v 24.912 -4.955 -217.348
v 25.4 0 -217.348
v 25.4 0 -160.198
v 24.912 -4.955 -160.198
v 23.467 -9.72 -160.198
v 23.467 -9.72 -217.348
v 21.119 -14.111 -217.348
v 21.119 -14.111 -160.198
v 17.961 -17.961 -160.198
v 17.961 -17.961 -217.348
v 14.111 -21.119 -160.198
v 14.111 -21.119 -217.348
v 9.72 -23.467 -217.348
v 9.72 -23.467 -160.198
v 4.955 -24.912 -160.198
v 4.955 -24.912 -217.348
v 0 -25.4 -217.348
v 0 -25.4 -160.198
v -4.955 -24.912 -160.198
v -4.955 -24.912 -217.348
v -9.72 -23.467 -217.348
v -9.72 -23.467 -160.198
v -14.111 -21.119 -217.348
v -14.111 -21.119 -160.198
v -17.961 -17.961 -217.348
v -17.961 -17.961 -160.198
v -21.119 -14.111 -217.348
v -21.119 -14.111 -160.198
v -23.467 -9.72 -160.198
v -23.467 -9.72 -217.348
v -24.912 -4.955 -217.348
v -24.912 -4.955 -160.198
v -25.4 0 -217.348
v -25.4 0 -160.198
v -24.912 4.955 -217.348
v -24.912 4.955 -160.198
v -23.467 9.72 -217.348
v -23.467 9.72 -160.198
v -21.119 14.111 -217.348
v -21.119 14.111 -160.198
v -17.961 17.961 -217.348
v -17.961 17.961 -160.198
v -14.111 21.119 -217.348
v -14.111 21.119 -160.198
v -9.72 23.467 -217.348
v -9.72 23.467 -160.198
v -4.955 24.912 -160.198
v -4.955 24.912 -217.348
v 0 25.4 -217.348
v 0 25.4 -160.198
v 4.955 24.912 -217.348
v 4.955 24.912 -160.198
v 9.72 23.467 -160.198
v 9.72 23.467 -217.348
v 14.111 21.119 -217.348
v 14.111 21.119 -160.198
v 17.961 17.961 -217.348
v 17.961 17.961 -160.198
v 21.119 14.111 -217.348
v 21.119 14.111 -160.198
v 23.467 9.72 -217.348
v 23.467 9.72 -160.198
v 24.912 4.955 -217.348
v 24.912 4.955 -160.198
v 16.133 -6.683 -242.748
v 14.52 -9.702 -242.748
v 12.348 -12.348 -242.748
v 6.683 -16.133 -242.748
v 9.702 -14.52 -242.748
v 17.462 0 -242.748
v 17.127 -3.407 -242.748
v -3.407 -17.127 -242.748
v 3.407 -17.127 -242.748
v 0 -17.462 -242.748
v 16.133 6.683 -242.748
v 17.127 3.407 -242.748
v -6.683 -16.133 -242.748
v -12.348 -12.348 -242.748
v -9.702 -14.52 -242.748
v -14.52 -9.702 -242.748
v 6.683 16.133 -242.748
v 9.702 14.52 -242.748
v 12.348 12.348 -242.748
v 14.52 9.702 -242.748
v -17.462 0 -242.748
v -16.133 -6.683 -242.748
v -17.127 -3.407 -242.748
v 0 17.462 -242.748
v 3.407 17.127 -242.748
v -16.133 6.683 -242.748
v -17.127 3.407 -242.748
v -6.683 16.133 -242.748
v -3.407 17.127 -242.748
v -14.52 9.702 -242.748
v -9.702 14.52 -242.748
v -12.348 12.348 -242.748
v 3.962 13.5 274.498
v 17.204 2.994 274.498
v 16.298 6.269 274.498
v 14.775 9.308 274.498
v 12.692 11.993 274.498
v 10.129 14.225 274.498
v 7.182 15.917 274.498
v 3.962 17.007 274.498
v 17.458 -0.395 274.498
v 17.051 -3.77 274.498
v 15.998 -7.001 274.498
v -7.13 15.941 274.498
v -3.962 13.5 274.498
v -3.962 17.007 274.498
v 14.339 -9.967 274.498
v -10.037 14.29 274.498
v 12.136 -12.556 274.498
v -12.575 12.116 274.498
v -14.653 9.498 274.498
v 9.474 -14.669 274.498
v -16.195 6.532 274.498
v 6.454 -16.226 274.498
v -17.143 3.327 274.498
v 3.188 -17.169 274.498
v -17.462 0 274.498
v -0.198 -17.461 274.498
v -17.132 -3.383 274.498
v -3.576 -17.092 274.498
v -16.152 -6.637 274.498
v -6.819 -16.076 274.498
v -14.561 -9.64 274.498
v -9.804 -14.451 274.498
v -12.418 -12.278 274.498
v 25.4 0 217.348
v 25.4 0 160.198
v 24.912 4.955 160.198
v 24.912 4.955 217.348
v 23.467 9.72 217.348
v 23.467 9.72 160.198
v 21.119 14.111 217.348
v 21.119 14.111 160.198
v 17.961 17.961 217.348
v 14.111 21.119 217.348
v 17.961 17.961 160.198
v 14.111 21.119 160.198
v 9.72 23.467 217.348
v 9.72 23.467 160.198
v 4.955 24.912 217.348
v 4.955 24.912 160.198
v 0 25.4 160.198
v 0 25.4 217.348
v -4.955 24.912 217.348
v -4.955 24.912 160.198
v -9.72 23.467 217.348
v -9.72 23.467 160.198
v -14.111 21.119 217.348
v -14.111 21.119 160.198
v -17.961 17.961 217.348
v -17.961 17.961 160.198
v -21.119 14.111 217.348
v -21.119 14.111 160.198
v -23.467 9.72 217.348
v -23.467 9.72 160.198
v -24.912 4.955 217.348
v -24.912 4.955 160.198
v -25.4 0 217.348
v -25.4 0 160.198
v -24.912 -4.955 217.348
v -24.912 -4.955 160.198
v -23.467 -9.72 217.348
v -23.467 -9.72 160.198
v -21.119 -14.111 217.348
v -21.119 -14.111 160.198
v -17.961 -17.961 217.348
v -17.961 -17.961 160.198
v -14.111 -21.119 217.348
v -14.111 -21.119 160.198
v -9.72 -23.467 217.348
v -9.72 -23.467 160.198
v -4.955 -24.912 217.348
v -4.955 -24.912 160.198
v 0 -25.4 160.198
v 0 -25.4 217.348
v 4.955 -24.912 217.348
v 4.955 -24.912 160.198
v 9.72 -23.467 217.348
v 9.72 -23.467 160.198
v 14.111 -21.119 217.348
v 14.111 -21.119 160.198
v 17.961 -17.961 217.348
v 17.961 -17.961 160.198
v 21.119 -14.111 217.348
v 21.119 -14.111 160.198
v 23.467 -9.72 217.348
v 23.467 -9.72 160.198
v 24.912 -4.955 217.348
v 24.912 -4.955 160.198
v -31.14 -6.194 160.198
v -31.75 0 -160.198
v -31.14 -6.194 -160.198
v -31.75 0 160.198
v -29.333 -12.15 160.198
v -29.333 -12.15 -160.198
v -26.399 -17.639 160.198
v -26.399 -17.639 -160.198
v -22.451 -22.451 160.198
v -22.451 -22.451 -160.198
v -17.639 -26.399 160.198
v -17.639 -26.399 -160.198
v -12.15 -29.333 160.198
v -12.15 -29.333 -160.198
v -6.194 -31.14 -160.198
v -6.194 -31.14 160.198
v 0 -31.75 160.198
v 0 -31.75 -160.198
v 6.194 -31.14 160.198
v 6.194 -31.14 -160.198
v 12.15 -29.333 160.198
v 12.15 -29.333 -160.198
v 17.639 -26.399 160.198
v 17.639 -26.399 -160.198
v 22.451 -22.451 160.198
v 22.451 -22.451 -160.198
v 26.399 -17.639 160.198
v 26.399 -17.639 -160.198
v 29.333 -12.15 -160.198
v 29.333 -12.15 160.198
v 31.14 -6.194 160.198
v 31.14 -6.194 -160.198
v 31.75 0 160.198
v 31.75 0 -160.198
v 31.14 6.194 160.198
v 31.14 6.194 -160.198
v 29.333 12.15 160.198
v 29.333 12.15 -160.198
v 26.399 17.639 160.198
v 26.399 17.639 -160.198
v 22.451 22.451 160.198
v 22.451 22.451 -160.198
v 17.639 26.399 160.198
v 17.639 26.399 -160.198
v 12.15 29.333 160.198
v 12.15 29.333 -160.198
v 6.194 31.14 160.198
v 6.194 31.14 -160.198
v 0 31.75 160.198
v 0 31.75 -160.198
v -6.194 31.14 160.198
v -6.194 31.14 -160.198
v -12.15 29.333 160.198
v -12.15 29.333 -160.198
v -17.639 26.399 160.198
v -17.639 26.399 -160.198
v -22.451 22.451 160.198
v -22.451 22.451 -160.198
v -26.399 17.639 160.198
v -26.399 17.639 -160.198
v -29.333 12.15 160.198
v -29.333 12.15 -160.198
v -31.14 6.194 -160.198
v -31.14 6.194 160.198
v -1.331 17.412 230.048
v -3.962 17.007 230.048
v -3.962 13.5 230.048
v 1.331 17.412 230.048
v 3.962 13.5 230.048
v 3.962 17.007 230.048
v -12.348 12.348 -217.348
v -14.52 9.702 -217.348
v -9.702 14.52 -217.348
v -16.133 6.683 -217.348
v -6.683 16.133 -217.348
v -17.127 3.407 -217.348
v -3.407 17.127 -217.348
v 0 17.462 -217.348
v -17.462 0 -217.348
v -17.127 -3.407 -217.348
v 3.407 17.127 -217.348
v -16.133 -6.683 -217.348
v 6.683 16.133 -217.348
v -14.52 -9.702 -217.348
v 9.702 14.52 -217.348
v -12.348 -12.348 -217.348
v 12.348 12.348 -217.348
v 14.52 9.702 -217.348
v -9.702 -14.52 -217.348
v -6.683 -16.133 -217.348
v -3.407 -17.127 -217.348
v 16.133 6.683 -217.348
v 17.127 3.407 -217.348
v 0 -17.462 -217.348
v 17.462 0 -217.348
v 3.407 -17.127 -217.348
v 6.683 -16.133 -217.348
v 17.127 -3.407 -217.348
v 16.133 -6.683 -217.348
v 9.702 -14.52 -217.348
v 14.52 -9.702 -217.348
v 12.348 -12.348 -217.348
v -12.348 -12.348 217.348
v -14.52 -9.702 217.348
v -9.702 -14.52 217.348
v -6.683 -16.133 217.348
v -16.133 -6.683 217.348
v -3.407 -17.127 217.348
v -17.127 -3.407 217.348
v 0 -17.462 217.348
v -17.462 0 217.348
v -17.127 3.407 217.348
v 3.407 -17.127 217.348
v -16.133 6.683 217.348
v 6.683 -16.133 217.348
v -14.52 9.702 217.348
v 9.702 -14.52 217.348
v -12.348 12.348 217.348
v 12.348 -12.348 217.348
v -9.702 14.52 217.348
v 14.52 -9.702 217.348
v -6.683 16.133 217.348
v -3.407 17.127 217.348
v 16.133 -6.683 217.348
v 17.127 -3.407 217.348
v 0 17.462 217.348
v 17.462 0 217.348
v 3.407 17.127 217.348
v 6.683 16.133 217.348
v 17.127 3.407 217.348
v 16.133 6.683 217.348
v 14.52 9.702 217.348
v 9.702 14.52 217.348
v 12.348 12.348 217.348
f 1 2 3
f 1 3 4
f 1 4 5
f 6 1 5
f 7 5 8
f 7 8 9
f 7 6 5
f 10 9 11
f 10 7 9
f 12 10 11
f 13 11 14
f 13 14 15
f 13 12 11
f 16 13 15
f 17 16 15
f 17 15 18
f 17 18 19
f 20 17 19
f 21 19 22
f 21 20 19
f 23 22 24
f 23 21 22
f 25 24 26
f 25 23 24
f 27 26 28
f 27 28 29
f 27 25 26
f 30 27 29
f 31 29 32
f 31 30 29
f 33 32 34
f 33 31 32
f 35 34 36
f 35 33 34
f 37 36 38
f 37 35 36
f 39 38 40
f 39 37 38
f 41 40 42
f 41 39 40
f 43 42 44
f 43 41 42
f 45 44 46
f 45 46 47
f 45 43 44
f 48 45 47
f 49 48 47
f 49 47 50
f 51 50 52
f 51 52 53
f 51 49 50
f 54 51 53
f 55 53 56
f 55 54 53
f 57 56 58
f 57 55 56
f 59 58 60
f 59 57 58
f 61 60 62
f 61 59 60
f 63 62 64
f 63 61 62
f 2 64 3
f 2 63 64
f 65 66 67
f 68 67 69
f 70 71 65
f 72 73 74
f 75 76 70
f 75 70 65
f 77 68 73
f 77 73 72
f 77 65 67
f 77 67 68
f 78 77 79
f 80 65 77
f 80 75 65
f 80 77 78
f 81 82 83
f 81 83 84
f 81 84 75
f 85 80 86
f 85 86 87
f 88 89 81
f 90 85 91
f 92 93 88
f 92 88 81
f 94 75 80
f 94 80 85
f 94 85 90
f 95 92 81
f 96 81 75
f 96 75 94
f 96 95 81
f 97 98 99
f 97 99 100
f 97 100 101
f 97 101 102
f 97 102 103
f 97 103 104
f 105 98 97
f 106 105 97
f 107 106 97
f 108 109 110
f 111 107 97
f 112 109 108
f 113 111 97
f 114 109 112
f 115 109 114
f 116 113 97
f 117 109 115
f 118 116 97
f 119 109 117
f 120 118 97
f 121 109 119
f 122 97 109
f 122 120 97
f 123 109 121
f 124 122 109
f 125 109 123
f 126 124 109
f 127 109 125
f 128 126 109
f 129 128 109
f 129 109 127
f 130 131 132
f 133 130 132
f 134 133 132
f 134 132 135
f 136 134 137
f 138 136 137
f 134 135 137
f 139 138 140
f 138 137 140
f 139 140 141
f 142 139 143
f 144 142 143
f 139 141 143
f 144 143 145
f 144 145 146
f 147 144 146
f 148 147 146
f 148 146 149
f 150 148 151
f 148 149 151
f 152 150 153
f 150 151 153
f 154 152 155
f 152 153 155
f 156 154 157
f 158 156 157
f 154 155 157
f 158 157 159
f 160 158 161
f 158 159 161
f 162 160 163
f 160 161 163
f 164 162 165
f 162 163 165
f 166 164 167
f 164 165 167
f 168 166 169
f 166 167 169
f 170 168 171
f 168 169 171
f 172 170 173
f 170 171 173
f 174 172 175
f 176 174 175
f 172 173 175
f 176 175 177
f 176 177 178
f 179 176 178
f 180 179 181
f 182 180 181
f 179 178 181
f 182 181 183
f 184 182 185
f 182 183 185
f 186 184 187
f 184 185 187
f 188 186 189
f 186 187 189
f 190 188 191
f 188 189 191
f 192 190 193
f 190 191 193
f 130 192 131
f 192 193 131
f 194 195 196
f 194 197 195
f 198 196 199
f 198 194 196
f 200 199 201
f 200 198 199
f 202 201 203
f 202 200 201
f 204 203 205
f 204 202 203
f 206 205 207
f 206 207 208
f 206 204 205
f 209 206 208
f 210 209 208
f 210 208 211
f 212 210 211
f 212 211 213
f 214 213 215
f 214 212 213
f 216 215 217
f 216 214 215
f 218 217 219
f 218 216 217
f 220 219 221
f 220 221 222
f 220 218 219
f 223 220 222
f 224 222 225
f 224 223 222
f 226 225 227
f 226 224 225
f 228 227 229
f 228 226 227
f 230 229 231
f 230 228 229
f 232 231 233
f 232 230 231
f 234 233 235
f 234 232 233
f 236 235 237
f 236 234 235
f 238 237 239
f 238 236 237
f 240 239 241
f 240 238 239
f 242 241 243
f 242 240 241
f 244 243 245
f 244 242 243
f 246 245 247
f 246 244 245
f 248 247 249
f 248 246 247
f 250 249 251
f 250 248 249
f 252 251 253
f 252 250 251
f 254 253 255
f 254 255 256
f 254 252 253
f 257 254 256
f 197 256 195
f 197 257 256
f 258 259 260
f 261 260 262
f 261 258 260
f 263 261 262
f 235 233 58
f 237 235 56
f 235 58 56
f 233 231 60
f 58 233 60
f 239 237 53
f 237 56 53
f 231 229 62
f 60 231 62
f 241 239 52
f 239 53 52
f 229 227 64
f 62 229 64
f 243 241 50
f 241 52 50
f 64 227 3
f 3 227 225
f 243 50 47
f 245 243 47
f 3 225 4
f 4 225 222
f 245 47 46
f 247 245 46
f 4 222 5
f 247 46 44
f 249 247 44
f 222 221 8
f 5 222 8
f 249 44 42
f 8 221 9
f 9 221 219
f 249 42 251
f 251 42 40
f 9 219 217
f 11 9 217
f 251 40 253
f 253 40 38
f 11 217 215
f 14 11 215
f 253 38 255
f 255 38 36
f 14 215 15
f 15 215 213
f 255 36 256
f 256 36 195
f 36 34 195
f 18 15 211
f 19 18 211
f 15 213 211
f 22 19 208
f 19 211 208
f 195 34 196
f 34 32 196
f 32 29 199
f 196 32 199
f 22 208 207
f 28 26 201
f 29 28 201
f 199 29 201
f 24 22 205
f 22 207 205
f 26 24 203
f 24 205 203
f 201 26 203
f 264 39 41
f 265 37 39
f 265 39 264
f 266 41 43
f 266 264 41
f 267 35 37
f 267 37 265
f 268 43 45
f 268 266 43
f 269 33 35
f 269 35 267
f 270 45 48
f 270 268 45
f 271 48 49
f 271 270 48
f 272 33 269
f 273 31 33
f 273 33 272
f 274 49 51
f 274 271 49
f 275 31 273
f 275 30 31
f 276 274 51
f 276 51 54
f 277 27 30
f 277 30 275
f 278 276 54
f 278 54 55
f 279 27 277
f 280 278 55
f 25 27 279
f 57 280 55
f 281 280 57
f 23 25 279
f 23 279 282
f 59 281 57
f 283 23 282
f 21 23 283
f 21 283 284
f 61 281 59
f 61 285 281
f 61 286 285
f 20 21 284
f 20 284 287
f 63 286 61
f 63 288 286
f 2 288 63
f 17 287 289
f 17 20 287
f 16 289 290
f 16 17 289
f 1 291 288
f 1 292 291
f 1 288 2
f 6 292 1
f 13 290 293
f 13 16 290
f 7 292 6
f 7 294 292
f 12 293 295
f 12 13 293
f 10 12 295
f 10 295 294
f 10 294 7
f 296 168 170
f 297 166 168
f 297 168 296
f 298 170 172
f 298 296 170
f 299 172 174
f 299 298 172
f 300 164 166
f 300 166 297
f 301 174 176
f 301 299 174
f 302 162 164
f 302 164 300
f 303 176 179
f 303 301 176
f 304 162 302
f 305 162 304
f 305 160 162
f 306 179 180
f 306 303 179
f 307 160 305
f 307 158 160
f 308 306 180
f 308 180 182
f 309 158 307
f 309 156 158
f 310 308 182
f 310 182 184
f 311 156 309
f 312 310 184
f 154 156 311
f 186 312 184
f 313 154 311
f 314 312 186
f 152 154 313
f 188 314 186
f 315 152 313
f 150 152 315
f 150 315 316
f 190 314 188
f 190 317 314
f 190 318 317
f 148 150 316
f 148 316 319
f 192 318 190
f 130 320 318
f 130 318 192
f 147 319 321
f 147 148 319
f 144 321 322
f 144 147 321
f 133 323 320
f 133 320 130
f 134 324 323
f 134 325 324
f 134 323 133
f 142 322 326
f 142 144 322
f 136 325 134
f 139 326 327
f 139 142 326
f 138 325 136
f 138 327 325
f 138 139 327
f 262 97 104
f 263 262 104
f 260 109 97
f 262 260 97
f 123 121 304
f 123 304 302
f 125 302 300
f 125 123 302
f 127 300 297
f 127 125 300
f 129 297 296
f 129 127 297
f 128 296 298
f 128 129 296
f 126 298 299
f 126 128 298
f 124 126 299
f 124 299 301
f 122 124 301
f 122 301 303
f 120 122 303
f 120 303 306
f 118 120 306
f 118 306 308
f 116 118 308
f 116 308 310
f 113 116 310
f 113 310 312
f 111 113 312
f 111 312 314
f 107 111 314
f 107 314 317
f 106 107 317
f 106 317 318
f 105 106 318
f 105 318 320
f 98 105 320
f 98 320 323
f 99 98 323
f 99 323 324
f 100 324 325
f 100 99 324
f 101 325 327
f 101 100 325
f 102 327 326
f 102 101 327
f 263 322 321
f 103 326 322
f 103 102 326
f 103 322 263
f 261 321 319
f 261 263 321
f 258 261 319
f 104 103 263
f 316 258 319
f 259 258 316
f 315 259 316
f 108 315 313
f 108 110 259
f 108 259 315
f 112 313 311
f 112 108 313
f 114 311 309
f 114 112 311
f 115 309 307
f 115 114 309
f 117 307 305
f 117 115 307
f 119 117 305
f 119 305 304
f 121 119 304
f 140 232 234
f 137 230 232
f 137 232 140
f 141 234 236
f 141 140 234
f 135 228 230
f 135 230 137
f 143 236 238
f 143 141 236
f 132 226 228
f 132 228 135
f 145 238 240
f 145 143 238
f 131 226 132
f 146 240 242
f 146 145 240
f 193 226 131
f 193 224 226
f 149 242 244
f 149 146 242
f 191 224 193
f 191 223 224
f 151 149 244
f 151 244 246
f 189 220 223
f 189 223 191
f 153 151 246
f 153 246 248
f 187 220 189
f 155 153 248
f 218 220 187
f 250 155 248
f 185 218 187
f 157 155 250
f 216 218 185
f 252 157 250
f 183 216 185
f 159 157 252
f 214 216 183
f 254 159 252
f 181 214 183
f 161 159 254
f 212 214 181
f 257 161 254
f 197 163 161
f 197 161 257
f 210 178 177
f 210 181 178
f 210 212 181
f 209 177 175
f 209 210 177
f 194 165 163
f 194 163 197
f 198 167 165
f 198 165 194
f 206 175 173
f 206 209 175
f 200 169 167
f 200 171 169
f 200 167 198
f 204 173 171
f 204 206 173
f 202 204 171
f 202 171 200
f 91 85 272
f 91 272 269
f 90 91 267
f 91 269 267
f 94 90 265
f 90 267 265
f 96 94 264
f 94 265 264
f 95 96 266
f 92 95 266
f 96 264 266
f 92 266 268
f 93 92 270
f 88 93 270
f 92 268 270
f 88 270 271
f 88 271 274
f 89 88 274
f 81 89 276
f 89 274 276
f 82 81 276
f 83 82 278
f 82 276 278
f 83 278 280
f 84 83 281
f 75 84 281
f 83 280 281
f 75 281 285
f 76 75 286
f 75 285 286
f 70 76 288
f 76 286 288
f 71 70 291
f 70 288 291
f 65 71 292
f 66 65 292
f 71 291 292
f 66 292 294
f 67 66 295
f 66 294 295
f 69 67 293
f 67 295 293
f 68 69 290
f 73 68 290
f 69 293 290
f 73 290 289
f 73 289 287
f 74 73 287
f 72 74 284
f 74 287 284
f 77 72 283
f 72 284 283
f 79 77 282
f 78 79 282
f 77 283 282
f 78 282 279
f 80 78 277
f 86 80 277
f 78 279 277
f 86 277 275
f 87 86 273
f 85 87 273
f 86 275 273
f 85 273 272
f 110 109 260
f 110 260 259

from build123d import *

# Parameters (mm, degrees)
SKETCH1_R           = 31.75
BOSS_EXTRUDE1_DEPTH = 160.1978
SKETCH2_R           = 25.4
BOSS_EXTRUDE2_DEPTH = 57.15
BOSS_EXTRUDE3_START = 57.15
SKETCH3_R           = 25.4
BOSS_EXTRUDE3_DEPTH = 57.15
SKETCH5_R           = 17.4625
BOSS_EXTRUDE5_DEPTH = 25.4
BOSS_EXTRUDE6_START = 57.15
SKETCH18_R          = 17.4625
BOSS_EXTRUDE6_DEPTH = 57.15
SKETCH20_W          = 7.9248
SKETCH20_H          = 7.9248
CUT_EXTRUDE1_DEPTH  = 44.45


with BuildPart() as part:
    # Sketch1 → Boss-Extrude1 (new, symmetric)
    with BuildSketch(Plane.XY):
        with Locations(Location((0, 0, 0), (0, 0, 180))):
            Circle(SKETCH1_R)
    extrude(amount=BOSS_EXTRUDE1_DEPTH, both=True)

    # Sketch2 → Boss-Extrude2 (add)
    with BuildSketch(Plane.XY.offset(160.1978)):
        Circle(SKETCH2_R)
    extrude(amount=BOSS_EXTRUDE2_DEPTH)

    # Sketch3 → Boss-Extrude3 (add)
    with BuildSketch(Plane(origin=(0, 0, -160.1978), x_dir=(-1, 0, 0), z_dir=(0, 0, -1)).offset(BOSS_EXTRUDE3_START)):
        with Locations(Location((0, 0, 0), (0, 0, 180))):
            Circle(SKETCH3_R)
    extrude(amount=-BOSS_EXTRUDE3_DEPTH)

    # Sketch5 → Boss-Extrude5 (add)
    with BuildSketch(Plane(origin=(0, 0, -217.3478), x_dir=(-1, 0, 0), z_dir=(0, 0, -1))):
        Circle(SKETCH5_R)
    extrude(amount=BOSS_EXTRUDE5_DEPTH)

    # Sketch18 → Boss-Extrude6 (add)
    with BuildSketch(Plane.XY.offset(217.3478).offset(BOSS_EXTRUDE6_START)):
        with Locations(Location((0, 0, 0), (0, 0, 180))):
            Circle(SKETCH18_R)
    extrude(amount=-BOSS_EXTRUDE6_DEPTH)

    # Sketch20 → Cut-Extrude1 (cut)
    with BuildSketch(Plane.XY.offset(274.4978)):
        with Locations((0, 17.4625)):
            Rectangle(SKETCH20_W, SKETCH20_H)
    extrude(amount=-CUT_EXTRUDE1_DEPTH, mode=Mode.SUBTRACT)


solid = part.part
